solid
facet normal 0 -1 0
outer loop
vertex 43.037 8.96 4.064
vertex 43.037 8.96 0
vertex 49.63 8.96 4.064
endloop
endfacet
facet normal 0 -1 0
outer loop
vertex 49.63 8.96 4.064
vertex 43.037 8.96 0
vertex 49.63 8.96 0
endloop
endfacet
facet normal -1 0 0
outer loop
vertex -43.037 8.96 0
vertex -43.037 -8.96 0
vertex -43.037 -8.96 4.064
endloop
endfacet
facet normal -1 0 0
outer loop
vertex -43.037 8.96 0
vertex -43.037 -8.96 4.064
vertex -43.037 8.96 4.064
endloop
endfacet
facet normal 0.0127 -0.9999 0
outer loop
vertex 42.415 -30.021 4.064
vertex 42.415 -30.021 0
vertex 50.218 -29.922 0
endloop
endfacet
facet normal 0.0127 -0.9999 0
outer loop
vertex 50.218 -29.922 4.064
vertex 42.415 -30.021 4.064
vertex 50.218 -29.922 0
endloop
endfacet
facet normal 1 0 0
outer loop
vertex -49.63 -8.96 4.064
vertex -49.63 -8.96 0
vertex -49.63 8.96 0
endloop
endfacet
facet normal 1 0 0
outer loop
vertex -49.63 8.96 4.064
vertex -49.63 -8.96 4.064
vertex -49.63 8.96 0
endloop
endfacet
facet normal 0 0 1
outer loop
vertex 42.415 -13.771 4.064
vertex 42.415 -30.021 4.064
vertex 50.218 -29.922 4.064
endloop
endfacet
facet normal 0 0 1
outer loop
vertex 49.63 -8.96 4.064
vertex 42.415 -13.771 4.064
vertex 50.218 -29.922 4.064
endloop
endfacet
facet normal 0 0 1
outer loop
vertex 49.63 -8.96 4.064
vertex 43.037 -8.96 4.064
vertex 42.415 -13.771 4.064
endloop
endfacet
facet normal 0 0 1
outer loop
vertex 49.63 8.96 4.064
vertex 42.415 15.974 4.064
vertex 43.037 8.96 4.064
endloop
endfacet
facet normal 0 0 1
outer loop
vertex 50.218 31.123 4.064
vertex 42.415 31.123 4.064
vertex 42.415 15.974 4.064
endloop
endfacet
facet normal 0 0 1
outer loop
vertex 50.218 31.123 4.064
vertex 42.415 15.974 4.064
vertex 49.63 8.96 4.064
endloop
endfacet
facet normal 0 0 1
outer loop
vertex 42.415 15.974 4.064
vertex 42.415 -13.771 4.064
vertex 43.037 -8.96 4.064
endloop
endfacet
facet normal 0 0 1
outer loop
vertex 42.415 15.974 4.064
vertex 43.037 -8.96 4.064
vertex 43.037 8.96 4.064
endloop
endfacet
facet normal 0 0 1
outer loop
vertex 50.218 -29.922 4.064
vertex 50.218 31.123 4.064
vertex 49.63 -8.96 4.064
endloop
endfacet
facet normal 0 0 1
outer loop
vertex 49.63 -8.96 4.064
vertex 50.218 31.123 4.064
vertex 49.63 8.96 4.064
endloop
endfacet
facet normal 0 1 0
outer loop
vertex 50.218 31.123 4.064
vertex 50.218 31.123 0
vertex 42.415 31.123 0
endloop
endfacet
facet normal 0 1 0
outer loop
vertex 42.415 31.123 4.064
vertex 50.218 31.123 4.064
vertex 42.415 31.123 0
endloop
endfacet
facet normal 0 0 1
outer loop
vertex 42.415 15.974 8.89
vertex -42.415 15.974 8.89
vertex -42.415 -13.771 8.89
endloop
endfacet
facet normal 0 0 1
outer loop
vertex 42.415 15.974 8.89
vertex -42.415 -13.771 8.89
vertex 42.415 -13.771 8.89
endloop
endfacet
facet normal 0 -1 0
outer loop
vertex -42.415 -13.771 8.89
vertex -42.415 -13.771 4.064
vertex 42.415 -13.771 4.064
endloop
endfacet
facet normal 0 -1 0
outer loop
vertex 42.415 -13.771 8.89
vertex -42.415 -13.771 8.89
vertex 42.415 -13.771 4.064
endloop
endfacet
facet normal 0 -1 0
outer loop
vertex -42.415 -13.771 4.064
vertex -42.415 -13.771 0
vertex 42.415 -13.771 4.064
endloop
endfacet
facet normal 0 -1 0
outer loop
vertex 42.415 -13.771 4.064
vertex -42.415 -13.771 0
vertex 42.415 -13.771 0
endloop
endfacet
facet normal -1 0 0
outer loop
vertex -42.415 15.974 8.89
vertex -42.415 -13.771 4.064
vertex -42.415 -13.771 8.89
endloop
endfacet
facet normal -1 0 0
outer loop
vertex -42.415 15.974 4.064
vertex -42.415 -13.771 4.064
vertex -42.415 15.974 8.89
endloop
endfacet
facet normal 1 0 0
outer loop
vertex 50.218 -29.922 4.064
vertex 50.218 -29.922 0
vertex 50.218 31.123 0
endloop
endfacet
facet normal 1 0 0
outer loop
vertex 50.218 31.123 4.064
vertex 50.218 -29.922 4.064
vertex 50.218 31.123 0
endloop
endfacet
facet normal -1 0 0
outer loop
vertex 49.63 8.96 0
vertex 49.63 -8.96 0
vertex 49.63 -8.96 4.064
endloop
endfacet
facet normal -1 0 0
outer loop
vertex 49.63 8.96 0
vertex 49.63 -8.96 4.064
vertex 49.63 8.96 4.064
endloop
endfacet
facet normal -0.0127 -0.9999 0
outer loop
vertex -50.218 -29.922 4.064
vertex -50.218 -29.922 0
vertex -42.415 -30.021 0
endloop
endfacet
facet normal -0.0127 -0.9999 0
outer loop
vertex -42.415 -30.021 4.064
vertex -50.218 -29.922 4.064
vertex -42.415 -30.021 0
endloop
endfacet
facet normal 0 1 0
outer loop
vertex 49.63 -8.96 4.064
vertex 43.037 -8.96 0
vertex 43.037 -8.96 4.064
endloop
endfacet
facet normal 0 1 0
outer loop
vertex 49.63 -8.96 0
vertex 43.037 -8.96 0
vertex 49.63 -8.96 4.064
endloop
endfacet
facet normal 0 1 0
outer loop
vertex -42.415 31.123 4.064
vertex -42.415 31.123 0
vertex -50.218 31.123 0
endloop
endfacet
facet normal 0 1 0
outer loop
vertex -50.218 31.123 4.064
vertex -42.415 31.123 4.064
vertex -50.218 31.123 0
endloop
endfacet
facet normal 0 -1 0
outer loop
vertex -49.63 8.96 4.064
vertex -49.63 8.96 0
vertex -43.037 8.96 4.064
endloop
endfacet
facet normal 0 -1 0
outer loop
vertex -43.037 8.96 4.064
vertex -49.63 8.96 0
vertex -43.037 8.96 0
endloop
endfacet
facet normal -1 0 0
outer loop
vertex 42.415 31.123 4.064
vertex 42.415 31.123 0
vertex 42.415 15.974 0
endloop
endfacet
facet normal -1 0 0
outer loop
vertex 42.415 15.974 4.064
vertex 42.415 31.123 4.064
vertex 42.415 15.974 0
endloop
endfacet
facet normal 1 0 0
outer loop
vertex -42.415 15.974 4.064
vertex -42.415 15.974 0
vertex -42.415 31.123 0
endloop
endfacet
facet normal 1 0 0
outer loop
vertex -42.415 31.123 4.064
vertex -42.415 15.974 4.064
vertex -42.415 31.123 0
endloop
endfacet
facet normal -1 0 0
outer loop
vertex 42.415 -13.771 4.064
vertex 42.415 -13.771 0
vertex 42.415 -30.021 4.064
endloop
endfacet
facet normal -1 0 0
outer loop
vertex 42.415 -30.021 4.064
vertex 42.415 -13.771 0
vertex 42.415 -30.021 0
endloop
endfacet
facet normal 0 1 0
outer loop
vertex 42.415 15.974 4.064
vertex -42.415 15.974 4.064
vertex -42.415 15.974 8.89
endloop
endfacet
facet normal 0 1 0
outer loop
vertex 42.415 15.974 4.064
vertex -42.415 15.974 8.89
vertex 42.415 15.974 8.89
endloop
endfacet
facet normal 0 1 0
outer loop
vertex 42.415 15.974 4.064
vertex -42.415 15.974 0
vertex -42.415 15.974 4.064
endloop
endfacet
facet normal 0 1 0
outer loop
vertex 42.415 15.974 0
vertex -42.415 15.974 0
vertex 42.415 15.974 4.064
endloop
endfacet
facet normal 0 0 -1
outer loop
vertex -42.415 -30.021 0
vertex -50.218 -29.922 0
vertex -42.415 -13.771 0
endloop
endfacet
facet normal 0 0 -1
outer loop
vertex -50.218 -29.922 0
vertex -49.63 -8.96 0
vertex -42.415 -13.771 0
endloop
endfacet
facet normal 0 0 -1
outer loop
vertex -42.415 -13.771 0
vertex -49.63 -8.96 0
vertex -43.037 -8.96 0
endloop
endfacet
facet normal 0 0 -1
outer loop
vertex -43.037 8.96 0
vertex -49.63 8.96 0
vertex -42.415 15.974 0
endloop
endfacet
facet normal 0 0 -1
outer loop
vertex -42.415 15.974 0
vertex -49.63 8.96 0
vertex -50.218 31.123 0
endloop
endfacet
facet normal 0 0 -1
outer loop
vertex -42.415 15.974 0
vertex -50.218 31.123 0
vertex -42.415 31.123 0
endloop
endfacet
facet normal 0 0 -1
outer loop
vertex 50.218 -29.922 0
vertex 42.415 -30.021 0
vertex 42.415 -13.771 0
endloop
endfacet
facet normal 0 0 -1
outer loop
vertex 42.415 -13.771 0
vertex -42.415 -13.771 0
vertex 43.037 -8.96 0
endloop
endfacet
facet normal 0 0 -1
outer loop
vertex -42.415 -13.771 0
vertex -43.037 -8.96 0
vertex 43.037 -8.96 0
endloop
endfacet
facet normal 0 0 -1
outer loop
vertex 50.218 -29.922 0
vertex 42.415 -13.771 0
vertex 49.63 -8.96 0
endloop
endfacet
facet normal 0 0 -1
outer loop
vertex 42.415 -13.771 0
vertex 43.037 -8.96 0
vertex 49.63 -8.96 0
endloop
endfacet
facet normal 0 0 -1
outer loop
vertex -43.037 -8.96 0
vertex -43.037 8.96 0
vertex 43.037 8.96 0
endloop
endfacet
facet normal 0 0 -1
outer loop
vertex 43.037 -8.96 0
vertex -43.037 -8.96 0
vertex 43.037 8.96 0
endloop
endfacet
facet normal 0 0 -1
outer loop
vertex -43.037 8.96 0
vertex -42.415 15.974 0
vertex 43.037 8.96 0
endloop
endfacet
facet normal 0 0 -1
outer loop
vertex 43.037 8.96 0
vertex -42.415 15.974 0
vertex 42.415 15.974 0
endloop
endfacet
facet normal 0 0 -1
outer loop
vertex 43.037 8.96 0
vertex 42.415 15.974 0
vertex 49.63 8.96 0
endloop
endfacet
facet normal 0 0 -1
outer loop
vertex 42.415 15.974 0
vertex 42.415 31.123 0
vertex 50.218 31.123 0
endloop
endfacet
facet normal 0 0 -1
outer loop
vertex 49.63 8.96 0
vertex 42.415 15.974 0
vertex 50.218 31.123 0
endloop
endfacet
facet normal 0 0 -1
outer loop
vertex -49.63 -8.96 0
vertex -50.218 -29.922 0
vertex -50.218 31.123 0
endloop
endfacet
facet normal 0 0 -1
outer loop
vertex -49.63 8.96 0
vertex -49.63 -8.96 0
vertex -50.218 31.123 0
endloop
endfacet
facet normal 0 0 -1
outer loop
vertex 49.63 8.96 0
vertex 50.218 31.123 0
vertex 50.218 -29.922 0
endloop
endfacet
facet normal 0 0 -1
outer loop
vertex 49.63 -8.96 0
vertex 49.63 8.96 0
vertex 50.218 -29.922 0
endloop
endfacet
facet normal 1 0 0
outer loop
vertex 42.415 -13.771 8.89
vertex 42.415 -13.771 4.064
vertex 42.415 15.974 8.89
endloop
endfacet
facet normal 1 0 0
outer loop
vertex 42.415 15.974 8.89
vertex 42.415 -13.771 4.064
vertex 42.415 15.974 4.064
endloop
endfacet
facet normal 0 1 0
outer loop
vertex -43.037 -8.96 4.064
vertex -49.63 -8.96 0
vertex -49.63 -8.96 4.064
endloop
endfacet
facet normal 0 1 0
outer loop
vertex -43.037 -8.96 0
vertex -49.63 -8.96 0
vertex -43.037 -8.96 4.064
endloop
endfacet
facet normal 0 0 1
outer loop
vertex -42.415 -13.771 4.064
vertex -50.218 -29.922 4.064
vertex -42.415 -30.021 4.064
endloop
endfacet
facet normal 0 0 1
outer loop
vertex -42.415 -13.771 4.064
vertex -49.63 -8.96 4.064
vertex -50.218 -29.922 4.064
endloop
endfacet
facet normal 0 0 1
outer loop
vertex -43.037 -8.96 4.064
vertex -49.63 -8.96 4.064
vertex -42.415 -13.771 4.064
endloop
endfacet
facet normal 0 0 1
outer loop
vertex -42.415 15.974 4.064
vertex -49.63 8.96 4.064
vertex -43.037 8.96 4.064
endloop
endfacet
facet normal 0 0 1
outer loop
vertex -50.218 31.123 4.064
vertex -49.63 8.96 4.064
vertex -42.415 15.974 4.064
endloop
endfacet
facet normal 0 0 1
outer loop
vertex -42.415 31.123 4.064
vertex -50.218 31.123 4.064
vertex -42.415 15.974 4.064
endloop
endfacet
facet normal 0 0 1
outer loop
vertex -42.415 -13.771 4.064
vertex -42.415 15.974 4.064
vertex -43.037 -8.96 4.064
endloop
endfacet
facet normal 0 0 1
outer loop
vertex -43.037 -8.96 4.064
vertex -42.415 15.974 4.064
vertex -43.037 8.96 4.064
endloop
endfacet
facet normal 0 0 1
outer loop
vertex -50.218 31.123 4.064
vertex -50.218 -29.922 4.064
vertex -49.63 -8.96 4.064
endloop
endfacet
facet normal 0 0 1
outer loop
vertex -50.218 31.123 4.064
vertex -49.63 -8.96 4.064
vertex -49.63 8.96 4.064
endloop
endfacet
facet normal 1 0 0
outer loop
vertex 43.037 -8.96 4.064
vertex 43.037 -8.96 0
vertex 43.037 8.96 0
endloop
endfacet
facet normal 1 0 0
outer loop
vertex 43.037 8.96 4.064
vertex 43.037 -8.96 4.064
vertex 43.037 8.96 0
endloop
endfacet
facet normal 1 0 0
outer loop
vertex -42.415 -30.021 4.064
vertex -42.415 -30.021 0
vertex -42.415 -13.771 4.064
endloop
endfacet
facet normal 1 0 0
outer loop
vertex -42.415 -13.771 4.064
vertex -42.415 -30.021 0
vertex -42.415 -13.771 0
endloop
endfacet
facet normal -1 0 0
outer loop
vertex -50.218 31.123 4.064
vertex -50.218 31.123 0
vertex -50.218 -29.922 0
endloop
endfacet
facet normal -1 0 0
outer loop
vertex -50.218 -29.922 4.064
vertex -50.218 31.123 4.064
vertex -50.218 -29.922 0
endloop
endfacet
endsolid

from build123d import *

# Parameters (mm, degrees)
F1_DEPTH = 4.064
F2_W     = 84.829882
F2_H     = 29.745544
F3_DEPTH = 4.826
F4_W     = 6.593369
F4_H     = 17.919544
F5_DEPTH = 27.94


with BuildPart() as f1:
    # F0 (on Top) → F1 (new body)
    with BuildSketch(Plane.XY):
        Polygon((42.414941, 15.974458), (0, 15.974458), (-42.414941, 15.974458), (-42.414941, -13.771086), (0, -13.771086), (42.414941, -13.771086), align=None)
        Polygon((-42.414941, -13.771086), (-42.414941, 15.974458), (-42.414941, 31.122651), (-50.217658, 31.122651), (-50.217658, -29.922441), (-42.414941, -30.020962), align=None)
        Polygon((42.414941, 31.122651), (42.414941, 15.974458), (42.414941, -13.771086), (42.414941, -30.020962), (50.217658, -29.922441), (50.217658, 31.122651), align=None)
    extrude(amount=F1_DEPTH)

    # F2 (on face) → F3 (join)
    with BuildSketch(Plane.XY.offset(4.064)):
        with Locations((0, 1.101686)):
            Rectangle(F2_W, F2_H)
    extrude(amount=F3_DEPTH)

    # F4 (on Top) → F5 (cut)
    with BuildSketch(Plane.XY):
        with Locations((46.333633, 0)):
            Rectangle(F4_W, F4_H)
        with Locations((-46.333633, 0)):
            Rectangle(F4_W, F4_H)
    extrude(amount=F5_DEPTH, mode=Mode.SUBTRACT)


solid = f1.part
